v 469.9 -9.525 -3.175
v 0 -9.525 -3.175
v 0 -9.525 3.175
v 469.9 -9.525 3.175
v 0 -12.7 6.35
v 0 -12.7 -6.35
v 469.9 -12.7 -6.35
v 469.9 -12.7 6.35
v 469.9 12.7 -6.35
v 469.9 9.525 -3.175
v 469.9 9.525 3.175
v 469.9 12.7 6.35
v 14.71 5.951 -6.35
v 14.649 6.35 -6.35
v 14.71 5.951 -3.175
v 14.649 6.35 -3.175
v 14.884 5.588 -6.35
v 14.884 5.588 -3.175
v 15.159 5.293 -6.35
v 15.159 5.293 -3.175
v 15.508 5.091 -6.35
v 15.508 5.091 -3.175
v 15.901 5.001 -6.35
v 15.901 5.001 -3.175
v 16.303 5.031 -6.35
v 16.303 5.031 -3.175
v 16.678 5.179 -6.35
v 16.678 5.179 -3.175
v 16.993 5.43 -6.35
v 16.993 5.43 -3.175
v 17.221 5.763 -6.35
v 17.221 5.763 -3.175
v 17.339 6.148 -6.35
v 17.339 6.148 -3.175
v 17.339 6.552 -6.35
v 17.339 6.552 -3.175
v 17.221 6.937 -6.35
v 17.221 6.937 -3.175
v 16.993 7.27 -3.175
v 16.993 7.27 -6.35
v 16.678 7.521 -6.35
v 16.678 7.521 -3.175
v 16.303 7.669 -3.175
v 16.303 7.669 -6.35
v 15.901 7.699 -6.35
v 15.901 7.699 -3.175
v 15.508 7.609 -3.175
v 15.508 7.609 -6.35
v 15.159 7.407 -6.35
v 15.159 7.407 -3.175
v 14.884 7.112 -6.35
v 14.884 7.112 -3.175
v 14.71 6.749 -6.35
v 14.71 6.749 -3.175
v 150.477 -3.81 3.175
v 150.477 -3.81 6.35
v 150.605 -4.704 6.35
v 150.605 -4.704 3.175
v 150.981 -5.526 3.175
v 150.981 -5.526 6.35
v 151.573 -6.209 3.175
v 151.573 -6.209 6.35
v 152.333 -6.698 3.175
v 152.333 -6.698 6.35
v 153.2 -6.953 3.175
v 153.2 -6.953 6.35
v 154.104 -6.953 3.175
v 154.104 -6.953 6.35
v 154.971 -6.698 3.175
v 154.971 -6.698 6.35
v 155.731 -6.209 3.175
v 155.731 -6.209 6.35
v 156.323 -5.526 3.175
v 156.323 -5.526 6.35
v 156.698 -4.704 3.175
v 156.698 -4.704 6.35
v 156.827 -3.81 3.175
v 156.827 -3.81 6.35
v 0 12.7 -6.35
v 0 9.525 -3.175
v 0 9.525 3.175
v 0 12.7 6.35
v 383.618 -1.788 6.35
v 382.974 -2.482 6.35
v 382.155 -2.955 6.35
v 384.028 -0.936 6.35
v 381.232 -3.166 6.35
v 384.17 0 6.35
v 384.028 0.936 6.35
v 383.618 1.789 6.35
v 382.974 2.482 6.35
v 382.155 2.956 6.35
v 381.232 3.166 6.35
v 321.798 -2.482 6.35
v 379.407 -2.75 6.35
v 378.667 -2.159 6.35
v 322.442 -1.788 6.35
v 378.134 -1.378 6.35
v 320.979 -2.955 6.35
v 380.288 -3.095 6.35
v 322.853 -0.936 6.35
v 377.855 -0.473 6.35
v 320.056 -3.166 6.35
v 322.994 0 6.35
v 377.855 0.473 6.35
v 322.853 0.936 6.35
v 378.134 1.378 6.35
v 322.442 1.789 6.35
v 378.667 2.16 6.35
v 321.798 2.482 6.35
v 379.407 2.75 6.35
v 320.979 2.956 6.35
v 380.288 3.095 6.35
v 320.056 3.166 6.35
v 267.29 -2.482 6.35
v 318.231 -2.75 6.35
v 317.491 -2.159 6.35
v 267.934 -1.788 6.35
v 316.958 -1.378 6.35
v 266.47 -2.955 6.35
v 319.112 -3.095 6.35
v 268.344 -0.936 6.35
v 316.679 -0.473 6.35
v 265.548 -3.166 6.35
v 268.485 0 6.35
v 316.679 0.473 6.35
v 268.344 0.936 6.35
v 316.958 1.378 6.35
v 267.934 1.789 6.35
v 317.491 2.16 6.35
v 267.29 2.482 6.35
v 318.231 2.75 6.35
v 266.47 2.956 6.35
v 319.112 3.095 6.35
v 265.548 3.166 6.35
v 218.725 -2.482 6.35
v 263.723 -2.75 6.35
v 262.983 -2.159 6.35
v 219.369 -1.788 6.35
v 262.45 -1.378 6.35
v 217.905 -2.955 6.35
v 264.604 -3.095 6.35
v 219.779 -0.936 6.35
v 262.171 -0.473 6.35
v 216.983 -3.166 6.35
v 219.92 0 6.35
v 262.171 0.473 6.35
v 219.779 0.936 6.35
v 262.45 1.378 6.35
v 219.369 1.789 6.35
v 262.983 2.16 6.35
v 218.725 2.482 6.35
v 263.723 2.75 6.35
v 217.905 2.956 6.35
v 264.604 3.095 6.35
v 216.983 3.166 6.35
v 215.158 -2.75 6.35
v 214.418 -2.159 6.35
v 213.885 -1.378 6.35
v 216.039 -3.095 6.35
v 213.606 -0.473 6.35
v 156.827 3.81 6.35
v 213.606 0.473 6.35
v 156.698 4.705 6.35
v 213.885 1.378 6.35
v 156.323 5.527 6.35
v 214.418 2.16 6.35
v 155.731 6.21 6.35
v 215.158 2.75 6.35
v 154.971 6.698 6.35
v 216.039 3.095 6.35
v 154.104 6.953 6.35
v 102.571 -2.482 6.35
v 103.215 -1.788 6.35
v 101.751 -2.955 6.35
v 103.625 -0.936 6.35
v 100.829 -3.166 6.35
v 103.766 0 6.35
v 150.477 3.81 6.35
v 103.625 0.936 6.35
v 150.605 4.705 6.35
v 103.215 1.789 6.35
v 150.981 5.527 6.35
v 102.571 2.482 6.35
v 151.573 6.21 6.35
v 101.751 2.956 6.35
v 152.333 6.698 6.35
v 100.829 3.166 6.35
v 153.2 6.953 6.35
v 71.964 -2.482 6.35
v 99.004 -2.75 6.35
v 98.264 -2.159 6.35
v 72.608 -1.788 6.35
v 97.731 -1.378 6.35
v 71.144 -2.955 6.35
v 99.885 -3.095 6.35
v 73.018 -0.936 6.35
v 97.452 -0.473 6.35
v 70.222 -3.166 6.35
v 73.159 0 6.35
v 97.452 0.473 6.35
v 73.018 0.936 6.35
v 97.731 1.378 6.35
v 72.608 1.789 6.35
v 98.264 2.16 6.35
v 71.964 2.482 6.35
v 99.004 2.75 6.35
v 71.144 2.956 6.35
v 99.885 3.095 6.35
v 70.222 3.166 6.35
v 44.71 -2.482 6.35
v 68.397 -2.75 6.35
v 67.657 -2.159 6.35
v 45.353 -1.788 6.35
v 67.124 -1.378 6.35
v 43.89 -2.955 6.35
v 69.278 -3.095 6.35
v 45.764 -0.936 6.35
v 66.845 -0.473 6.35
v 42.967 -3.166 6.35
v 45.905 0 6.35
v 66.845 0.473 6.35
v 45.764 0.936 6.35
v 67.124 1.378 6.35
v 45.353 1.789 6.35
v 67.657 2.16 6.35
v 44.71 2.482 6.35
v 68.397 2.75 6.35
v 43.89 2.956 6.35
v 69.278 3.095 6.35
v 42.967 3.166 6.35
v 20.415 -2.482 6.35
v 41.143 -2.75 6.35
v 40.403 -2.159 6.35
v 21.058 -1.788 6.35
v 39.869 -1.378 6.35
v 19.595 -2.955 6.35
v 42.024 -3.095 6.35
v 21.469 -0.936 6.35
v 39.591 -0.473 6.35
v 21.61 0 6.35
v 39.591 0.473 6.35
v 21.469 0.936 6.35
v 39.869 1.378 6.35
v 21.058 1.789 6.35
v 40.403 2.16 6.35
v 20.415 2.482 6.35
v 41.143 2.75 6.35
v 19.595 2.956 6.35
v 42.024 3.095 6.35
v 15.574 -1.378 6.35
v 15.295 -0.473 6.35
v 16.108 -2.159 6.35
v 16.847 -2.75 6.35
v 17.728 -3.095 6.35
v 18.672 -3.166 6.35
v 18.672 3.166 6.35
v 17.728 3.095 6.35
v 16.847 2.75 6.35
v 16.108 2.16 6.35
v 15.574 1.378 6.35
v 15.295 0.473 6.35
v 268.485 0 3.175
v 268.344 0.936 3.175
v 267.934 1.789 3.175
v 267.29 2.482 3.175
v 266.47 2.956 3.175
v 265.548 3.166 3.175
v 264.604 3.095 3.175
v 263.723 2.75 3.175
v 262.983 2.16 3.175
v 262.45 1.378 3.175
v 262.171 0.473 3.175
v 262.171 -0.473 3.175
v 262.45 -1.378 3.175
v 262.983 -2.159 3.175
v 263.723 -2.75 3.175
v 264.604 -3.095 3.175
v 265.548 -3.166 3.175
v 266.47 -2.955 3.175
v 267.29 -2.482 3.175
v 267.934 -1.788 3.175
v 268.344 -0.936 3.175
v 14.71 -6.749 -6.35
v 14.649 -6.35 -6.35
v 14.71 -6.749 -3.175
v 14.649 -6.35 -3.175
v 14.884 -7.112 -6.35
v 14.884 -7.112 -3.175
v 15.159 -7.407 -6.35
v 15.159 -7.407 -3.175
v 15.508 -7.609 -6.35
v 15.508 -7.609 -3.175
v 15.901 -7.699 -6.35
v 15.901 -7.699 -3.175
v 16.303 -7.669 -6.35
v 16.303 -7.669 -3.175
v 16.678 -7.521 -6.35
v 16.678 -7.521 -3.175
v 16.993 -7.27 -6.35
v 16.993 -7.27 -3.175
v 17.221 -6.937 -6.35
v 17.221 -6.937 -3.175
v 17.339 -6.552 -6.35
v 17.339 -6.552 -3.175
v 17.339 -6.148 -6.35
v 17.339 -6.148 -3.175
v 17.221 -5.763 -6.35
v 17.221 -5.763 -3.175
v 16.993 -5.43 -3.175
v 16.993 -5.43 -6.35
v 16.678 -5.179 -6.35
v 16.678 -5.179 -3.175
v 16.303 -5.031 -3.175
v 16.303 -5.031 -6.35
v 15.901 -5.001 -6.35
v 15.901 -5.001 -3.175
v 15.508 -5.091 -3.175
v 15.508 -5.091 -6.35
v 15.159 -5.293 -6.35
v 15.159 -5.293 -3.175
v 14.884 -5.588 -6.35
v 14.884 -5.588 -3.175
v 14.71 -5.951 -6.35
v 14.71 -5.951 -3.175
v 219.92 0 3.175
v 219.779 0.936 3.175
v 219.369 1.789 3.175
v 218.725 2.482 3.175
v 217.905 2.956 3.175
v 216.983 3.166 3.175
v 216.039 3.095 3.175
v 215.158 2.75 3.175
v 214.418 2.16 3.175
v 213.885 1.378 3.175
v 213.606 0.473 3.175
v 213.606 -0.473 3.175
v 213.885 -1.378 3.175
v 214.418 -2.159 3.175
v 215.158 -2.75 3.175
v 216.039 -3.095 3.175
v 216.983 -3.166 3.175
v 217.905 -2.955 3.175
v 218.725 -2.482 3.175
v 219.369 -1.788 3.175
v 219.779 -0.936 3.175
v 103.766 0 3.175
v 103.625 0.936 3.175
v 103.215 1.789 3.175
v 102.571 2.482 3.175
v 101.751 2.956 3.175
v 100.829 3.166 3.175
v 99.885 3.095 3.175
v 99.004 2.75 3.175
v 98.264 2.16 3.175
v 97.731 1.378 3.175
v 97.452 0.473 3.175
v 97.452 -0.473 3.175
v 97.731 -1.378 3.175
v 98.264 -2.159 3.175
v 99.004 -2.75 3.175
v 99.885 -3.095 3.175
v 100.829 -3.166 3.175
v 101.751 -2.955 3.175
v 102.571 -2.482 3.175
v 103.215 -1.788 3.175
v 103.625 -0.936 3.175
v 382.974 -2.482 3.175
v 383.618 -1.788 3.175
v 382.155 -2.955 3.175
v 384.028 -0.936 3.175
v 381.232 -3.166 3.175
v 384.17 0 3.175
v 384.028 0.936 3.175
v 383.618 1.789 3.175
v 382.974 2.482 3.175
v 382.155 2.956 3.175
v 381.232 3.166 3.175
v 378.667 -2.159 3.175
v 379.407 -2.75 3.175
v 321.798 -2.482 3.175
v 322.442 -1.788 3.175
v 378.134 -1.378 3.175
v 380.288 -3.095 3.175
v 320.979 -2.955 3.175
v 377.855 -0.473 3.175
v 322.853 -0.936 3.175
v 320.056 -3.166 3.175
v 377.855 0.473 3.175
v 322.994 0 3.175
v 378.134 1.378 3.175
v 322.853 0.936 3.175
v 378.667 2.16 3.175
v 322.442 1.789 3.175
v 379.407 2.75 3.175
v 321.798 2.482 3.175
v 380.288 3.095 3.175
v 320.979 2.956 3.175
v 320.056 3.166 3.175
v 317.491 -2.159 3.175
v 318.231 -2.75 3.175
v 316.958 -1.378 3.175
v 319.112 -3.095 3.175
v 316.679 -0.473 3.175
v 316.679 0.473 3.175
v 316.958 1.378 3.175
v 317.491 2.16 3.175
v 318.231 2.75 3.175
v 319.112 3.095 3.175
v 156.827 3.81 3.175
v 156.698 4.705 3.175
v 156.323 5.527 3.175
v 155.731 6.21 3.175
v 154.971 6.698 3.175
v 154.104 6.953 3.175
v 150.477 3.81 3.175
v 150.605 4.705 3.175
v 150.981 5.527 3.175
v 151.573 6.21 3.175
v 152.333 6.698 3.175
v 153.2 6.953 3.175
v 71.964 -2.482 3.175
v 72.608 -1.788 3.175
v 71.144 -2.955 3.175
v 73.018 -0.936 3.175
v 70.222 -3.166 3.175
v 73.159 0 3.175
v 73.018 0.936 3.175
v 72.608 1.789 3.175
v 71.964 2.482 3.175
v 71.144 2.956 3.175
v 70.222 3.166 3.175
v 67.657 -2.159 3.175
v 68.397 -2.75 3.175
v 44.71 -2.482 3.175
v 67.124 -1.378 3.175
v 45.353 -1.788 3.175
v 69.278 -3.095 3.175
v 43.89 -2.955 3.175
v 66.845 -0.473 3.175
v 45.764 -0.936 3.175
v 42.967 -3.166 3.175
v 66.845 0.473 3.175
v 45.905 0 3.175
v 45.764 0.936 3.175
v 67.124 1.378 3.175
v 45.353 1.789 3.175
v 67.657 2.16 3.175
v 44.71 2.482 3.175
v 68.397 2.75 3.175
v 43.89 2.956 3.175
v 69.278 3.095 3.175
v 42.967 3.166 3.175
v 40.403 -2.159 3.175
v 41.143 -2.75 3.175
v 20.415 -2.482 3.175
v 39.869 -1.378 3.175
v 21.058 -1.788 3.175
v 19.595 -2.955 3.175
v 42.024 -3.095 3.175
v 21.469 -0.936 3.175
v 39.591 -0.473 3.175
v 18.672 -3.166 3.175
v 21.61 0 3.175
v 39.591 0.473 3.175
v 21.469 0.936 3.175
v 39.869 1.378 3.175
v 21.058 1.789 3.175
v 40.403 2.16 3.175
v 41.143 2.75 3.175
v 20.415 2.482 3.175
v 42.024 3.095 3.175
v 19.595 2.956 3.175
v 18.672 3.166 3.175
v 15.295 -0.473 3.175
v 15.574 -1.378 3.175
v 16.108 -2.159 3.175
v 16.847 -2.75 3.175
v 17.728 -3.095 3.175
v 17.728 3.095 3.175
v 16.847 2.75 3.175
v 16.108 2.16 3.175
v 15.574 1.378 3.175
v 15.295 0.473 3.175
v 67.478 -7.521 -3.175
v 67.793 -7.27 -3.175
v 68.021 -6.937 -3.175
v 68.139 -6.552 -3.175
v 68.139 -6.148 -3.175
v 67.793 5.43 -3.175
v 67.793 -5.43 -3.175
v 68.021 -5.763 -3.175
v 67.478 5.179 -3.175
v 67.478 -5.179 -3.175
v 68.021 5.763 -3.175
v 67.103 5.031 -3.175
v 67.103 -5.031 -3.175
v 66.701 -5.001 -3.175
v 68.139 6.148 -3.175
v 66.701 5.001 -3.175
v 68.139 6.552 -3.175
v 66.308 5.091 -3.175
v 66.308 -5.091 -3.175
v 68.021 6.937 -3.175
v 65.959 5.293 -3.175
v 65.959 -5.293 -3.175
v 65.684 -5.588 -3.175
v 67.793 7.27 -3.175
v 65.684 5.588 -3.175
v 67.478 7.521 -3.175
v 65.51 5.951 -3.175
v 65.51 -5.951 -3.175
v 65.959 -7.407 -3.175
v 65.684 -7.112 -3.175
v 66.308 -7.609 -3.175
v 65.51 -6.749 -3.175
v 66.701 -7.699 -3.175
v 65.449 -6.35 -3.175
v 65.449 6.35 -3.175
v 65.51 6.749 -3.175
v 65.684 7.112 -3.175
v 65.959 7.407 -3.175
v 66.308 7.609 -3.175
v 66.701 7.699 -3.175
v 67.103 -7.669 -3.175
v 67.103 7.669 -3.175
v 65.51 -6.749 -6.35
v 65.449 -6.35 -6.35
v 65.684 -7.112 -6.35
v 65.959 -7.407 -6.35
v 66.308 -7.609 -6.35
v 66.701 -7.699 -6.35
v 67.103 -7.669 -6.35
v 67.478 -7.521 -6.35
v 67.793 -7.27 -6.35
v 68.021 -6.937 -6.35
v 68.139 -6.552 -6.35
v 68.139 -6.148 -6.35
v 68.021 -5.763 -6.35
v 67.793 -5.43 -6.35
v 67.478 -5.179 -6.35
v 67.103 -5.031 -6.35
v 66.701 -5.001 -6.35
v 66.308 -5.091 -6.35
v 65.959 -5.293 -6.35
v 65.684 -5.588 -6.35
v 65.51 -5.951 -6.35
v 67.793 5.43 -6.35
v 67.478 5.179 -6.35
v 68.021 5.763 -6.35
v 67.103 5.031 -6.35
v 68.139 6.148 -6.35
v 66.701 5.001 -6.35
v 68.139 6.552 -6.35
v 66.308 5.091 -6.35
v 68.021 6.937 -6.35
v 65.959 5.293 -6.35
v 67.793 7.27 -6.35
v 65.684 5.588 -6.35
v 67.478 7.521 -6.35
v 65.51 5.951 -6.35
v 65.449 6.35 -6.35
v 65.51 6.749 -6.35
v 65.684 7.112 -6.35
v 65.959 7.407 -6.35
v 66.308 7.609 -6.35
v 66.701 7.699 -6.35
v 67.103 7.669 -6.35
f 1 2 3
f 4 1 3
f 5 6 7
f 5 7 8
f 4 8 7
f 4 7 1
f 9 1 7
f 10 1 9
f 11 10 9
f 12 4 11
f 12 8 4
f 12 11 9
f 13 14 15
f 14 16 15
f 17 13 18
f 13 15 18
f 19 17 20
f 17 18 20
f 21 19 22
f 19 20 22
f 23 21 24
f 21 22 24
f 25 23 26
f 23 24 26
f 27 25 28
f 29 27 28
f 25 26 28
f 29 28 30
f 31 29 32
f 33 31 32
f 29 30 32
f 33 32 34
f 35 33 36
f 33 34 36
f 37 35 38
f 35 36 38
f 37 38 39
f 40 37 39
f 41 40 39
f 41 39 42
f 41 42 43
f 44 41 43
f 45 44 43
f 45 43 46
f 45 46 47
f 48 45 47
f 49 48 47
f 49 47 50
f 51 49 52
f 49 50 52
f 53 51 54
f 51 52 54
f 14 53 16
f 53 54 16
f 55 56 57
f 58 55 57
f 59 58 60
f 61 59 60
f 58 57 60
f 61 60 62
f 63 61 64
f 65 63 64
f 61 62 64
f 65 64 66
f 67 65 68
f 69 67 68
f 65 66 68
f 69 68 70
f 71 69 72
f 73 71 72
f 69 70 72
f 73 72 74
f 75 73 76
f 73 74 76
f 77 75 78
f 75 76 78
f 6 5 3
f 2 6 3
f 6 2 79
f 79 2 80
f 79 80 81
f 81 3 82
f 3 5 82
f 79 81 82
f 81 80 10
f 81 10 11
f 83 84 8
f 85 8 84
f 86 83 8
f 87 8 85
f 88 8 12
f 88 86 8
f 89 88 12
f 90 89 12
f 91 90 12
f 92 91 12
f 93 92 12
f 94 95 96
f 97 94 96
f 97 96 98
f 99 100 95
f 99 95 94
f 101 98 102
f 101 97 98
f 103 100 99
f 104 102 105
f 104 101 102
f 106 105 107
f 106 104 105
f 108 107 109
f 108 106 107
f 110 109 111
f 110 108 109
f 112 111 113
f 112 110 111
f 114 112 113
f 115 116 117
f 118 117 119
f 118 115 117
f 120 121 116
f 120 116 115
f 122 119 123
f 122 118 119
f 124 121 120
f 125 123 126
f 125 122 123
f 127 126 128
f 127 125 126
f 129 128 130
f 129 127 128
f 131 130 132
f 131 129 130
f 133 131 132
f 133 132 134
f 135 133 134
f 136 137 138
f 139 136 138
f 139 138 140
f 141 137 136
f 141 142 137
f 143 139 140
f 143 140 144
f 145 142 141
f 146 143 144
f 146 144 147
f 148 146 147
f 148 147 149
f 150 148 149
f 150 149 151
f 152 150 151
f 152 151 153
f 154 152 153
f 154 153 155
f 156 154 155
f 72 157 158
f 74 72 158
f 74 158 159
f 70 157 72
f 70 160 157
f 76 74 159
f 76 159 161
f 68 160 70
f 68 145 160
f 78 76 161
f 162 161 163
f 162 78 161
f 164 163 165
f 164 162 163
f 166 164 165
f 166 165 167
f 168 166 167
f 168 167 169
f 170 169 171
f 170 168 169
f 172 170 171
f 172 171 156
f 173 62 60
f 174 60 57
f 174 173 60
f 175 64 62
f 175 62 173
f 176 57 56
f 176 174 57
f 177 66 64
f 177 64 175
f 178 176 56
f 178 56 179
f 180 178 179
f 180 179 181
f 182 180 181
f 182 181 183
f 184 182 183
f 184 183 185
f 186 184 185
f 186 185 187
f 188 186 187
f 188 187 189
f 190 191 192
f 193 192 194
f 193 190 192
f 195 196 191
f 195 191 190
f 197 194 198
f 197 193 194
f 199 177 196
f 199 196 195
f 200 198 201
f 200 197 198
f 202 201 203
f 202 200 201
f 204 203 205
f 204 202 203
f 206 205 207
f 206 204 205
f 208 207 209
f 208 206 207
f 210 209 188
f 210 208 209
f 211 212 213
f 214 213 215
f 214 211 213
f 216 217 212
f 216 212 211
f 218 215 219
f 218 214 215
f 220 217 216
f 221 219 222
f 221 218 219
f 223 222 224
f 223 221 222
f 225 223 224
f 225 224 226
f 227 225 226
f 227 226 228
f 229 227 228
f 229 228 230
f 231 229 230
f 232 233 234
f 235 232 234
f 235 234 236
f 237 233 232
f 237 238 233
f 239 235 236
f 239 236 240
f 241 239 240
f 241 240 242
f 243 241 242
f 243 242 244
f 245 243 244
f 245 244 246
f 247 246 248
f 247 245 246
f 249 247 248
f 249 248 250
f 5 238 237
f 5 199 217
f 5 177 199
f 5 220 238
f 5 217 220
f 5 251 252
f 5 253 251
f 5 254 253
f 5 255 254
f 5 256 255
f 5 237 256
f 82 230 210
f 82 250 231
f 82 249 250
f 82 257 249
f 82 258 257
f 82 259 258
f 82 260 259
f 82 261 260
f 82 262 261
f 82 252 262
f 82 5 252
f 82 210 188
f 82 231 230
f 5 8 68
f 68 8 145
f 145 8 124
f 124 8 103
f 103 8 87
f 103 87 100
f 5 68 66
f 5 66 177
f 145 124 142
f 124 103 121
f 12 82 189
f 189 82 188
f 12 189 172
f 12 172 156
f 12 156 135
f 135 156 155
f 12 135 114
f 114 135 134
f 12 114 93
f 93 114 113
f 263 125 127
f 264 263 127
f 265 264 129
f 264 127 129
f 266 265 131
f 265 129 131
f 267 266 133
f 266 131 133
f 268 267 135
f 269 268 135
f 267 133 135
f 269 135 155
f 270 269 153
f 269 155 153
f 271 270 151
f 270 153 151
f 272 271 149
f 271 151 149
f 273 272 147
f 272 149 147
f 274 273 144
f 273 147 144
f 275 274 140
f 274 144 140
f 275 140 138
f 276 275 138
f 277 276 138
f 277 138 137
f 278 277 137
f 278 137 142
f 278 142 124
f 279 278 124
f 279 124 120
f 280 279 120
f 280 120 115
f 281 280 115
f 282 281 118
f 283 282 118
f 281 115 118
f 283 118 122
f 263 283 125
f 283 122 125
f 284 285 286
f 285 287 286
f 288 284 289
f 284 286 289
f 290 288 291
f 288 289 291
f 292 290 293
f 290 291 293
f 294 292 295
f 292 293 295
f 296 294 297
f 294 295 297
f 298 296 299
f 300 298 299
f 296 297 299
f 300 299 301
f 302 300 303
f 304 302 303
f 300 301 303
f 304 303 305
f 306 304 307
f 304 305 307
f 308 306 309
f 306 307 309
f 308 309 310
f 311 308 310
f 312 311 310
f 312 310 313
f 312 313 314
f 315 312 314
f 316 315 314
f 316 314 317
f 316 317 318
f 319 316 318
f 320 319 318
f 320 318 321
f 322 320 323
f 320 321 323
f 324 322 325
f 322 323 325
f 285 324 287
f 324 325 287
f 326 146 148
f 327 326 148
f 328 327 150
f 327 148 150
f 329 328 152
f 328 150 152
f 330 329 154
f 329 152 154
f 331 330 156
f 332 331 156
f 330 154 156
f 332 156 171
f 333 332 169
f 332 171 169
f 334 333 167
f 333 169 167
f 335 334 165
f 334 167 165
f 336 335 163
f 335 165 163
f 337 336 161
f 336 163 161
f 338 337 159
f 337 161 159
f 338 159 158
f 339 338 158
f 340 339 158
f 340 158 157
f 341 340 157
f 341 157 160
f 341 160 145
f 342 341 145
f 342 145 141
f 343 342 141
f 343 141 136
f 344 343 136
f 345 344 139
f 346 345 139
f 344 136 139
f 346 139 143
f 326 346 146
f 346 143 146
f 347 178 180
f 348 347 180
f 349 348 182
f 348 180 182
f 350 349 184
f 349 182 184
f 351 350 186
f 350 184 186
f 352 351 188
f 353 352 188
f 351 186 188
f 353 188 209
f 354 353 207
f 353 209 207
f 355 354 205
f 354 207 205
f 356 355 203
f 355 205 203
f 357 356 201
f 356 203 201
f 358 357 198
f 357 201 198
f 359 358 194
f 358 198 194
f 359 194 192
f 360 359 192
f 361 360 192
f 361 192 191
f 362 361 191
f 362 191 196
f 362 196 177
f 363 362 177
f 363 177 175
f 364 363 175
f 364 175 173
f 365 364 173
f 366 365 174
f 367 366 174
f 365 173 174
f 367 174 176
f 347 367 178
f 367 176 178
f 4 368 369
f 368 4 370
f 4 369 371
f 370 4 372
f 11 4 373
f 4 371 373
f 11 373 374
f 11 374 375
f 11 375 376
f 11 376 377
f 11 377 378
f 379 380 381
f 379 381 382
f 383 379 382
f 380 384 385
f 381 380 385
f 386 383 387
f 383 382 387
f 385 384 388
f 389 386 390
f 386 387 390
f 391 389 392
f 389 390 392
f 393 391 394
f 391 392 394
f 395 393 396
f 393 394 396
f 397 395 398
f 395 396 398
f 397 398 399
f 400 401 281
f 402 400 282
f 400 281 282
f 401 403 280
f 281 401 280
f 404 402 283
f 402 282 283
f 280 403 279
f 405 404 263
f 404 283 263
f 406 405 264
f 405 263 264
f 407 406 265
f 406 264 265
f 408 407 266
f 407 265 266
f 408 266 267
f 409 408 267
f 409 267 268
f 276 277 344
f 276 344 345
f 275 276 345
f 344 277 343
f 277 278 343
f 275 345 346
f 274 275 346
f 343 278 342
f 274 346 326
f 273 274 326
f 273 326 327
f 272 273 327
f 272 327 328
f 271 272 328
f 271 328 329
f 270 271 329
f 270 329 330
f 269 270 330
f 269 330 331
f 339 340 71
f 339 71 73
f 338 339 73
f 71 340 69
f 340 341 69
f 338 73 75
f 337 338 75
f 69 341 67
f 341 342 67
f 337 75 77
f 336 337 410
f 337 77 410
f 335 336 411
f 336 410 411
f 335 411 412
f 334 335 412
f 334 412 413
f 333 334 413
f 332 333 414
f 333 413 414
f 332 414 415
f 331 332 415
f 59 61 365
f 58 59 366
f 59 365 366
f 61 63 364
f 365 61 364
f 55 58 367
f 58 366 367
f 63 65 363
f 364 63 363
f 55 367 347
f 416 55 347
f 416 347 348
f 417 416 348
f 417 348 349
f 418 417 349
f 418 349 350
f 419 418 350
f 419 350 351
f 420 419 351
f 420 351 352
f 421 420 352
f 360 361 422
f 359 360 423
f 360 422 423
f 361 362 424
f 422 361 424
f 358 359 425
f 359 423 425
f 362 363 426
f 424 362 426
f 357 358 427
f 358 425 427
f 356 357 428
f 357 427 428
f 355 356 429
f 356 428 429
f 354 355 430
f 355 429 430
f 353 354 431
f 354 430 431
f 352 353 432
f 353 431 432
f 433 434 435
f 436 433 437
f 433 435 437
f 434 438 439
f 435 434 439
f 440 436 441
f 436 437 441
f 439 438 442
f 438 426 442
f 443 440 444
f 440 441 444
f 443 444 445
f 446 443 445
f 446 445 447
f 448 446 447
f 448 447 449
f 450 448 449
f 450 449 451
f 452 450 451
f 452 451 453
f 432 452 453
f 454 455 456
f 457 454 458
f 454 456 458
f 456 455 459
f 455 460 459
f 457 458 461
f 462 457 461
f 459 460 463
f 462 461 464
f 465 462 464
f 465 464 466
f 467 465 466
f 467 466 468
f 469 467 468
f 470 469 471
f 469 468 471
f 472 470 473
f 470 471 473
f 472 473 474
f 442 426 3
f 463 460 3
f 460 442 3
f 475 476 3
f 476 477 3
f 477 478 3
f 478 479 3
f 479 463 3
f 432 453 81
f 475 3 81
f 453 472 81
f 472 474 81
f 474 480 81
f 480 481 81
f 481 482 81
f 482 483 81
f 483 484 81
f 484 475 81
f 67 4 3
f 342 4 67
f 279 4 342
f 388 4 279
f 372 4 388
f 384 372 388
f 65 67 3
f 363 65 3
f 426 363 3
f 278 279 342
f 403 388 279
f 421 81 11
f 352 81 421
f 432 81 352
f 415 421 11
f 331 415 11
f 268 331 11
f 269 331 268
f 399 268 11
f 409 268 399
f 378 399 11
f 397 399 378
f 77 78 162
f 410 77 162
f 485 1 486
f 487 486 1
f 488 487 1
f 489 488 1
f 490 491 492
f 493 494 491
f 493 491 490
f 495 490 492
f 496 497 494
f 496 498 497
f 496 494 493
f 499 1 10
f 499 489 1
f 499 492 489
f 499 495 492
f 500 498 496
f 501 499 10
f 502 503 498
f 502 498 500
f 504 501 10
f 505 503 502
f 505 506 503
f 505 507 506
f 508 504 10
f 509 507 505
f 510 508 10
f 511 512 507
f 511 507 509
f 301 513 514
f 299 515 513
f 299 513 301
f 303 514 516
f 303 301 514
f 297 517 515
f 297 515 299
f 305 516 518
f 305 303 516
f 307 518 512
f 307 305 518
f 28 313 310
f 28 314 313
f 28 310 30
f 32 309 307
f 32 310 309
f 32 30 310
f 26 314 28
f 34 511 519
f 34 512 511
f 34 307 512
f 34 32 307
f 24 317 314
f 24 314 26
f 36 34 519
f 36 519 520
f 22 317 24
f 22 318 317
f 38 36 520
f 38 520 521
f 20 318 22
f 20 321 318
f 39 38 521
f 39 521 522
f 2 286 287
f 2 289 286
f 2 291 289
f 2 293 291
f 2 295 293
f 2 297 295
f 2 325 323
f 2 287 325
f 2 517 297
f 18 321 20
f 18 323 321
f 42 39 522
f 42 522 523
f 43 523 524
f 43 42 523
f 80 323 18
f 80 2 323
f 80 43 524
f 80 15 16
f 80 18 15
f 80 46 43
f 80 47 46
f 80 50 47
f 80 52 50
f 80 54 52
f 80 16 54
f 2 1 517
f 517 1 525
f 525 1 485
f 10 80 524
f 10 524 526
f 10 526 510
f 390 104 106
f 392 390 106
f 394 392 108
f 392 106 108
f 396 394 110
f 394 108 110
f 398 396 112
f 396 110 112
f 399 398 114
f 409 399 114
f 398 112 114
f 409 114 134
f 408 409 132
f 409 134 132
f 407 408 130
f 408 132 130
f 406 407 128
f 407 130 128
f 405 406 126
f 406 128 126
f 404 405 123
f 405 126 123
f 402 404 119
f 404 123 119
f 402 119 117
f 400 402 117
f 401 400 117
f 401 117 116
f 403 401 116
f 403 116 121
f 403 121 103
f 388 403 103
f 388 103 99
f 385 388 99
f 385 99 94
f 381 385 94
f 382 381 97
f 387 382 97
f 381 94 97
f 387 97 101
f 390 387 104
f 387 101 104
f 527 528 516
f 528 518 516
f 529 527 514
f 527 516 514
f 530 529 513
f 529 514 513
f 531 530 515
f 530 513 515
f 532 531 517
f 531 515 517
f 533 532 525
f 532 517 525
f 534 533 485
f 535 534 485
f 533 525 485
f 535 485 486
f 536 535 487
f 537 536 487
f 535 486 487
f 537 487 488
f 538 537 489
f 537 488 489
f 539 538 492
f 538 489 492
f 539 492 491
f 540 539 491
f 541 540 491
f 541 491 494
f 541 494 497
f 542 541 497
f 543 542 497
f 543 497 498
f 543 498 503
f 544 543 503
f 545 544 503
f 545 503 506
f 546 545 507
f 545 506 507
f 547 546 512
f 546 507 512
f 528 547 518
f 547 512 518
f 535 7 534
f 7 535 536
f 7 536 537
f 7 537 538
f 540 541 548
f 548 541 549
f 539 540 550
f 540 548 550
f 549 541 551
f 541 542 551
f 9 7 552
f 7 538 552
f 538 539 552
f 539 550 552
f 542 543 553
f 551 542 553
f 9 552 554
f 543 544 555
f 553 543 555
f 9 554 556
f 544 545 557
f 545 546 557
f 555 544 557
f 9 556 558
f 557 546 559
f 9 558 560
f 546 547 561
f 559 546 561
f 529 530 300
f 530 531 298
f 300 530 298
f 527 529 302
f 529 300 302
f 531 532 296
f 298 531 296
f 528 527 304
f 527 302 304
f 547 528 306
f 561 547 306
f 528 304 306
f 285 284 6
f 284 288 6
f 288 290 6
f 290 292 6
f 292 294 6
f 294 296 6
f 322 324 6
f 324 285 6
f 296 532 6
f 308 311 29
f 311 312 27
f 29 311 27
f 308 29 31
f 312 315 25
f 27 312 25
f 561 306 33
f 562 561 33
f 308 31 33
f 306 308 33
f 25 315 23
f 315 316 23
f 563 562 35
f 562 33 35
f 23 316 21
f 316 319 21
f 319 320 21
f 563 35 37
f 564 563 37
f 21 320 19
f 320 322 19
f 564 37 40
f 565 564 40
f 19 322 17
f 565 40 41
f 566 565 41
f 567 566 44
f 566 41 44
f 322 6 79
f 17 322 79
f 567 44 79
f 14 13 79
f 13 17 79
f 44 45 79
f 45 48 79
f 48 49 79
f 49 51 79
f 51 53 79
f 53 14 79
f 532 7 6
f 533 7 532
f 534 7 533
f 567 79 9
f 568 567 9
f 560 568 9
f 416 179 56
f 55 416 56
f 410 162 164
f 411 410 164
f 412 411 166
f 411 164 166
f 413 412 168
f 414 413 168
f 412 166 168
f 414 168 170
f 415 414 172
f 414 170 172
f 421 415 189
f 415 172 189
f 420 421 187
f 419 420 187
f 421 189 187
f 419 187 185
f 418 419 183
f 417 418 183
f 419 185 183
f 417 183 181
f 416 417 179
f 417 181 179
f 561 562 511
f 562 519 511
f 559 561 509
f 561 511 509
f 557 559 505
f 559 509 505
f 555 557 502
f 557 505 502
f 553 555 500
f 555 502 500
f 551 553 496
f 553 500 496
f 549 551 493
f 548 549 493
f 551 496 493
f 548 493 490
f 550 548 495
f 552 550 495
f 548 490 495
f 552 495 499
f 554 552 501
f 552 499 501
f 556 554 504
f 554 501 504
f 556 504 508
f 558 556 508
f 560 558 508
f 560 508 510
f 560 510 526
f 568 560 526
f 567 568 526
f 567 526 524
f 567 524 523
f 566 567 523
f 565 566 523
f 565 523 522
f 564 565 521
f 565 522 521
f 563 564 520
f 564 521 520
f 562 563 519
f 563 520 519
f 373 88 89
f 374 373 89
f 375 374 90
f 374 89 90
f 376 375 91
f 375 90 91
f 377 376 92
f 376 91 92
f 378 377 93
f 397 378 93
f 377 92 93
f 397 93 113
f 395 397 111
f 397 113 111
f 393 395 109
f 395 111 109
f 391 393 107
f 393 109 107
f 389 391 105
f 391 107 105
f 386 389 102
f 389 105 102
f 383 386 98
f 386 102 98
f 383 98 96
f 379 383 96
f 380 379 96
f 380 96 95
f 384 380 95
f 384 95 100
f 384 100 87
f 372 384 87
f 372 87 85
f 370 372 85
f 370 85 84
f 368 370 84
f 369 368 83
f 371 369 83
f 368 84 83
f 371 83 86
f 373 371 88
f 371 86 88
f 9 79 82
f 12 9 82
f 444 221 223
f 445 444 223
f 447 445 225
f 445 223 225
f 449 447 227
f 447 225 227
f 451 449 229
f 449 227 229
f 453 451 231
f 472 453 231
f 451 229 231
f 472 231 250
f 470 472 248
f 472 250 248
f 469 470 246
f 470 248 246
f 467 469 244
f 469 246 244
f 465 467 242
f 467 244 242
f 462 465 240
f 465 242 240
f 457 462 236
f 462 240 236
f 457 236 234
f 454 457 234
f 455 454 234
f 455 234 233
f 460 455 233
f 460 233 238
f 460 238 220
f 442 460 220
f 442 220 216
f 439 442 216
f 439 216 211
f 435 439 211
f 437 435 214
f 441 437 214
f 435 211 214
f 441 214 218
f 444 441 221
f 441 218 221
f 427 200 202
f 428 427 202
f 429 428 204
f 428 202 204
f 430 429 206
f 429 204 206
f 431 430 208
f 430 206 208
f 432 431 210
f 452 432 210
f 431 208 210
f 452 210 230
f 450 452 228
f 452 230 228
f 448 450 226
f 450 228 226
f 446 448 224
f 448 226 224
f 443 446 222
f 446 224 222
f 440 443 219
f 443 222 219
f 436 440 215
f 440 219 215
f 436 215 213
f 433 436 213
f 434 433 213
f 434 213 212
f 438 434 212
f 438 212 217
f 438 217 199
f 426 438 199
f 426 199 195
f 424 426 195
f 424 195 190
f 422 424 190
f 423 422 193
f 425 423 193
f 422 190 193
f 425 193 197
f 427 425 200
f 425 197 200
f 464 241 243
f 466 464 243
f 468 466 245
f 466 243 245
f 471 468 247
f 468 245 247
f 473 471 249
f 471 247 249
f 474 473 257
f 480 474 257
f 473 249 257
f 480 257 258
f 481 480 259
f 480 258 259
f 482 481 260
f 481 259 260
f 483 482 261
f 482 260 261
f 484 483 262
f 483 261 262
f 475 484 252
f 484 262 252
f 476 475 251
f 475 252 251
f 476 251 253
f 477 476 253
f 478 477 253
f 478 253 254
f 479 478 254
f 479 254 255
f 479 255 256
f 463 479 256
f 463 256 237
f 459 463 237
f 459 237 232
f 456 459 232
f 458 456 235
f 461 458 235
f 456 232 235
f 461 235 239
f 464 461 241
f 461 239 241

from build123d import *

# Parameters (mm, degrees)
F0_W     = 25.4
F0_H     = 12.7
F0_W_2   = 19.05
F0_H_2   = 6.35
F1_DEPTH = 469.9
F4_D     = 2.7051
F4_DEPTH = 3.175
F4_TIP   = 0.8126940303
F5_R     = 3.175
F6_DEPTH = 3.175


with BuildPart() as f1:
    # F0 (on Right) → F1 (new body)
    with BuildSketch(Plane.YZ):
        Rectangle(F0_W, F0_H)
        Rectangle(F0_W_2, F0_H_2, mode=Mode.SUBTRACT)
    extrude(amount=F1_DEPTH)

    # F4
    with Locations(Plane(origin=(0, 0, -6.35), x_dir=(1, 0, 0), z_dir=(0, 0, -1))):
        with Locations((16.002, -6.35), (16.002, 6.35), (66.802, 6.35), (66.802, -6.35)):
            Hole(F4_D / 2, depth=F4_DEPTH)
            with Locations((0, 0, -(F4_DEPTH + F4_TIP / 2))):  # 118° drill point
                Cone(0, F4_D / 2, F4_TIP, mode=Mode.SUBTRACT)

    # F5 (on face) → F6 (cut)
    with BuildSketch(Plane.XY.offset(6.35)):
        with Locations((380.994543826, 6.90038e-05)):
            Circle(F5_R)
        with Locations((319.818643826, 6.90038e-05)):
            Circle(F5_R)
        with Locations((265.310243826, 6.90038e-05)):
            Circle(F5_R)
        with Locations((216.745443826, 6.90038e-05)):
            Circle(F5_R)
        with BuildLine():
            Line((150.476843826, 3.8100690038), (150.476843826, -3.8099309962))
            ThreePointArc((150.476843826, -3.8099309962), (153.651843826, -6.9849309962), (156.826843826, -3.8099309962))
            Line((156.826843826, -3.8099309962), (156.826843826, 3.8100690038))
            ThreePointArc((156.826843826, 3.8100690038), (153.651843826, 6.9850690038), (150.476843826, 3.8100690038))
        make_face()
        with Locations((100.591243826, 6.90038e-05)):
            Circle(F5_R)
        with Locations((69.984243826, 6.90038e-05)):
            Circle(F5_R)
        with Locations((42.730043826, 6.90038e-05)):
            Circle(F5_R)
        with Locations((18.434943826, 6.90038e-05)):
            Circle(F5_R)
    extrude(amount=-F6_DEPTH, mode=Mode.SUBTRACT)


solid = f1.part
